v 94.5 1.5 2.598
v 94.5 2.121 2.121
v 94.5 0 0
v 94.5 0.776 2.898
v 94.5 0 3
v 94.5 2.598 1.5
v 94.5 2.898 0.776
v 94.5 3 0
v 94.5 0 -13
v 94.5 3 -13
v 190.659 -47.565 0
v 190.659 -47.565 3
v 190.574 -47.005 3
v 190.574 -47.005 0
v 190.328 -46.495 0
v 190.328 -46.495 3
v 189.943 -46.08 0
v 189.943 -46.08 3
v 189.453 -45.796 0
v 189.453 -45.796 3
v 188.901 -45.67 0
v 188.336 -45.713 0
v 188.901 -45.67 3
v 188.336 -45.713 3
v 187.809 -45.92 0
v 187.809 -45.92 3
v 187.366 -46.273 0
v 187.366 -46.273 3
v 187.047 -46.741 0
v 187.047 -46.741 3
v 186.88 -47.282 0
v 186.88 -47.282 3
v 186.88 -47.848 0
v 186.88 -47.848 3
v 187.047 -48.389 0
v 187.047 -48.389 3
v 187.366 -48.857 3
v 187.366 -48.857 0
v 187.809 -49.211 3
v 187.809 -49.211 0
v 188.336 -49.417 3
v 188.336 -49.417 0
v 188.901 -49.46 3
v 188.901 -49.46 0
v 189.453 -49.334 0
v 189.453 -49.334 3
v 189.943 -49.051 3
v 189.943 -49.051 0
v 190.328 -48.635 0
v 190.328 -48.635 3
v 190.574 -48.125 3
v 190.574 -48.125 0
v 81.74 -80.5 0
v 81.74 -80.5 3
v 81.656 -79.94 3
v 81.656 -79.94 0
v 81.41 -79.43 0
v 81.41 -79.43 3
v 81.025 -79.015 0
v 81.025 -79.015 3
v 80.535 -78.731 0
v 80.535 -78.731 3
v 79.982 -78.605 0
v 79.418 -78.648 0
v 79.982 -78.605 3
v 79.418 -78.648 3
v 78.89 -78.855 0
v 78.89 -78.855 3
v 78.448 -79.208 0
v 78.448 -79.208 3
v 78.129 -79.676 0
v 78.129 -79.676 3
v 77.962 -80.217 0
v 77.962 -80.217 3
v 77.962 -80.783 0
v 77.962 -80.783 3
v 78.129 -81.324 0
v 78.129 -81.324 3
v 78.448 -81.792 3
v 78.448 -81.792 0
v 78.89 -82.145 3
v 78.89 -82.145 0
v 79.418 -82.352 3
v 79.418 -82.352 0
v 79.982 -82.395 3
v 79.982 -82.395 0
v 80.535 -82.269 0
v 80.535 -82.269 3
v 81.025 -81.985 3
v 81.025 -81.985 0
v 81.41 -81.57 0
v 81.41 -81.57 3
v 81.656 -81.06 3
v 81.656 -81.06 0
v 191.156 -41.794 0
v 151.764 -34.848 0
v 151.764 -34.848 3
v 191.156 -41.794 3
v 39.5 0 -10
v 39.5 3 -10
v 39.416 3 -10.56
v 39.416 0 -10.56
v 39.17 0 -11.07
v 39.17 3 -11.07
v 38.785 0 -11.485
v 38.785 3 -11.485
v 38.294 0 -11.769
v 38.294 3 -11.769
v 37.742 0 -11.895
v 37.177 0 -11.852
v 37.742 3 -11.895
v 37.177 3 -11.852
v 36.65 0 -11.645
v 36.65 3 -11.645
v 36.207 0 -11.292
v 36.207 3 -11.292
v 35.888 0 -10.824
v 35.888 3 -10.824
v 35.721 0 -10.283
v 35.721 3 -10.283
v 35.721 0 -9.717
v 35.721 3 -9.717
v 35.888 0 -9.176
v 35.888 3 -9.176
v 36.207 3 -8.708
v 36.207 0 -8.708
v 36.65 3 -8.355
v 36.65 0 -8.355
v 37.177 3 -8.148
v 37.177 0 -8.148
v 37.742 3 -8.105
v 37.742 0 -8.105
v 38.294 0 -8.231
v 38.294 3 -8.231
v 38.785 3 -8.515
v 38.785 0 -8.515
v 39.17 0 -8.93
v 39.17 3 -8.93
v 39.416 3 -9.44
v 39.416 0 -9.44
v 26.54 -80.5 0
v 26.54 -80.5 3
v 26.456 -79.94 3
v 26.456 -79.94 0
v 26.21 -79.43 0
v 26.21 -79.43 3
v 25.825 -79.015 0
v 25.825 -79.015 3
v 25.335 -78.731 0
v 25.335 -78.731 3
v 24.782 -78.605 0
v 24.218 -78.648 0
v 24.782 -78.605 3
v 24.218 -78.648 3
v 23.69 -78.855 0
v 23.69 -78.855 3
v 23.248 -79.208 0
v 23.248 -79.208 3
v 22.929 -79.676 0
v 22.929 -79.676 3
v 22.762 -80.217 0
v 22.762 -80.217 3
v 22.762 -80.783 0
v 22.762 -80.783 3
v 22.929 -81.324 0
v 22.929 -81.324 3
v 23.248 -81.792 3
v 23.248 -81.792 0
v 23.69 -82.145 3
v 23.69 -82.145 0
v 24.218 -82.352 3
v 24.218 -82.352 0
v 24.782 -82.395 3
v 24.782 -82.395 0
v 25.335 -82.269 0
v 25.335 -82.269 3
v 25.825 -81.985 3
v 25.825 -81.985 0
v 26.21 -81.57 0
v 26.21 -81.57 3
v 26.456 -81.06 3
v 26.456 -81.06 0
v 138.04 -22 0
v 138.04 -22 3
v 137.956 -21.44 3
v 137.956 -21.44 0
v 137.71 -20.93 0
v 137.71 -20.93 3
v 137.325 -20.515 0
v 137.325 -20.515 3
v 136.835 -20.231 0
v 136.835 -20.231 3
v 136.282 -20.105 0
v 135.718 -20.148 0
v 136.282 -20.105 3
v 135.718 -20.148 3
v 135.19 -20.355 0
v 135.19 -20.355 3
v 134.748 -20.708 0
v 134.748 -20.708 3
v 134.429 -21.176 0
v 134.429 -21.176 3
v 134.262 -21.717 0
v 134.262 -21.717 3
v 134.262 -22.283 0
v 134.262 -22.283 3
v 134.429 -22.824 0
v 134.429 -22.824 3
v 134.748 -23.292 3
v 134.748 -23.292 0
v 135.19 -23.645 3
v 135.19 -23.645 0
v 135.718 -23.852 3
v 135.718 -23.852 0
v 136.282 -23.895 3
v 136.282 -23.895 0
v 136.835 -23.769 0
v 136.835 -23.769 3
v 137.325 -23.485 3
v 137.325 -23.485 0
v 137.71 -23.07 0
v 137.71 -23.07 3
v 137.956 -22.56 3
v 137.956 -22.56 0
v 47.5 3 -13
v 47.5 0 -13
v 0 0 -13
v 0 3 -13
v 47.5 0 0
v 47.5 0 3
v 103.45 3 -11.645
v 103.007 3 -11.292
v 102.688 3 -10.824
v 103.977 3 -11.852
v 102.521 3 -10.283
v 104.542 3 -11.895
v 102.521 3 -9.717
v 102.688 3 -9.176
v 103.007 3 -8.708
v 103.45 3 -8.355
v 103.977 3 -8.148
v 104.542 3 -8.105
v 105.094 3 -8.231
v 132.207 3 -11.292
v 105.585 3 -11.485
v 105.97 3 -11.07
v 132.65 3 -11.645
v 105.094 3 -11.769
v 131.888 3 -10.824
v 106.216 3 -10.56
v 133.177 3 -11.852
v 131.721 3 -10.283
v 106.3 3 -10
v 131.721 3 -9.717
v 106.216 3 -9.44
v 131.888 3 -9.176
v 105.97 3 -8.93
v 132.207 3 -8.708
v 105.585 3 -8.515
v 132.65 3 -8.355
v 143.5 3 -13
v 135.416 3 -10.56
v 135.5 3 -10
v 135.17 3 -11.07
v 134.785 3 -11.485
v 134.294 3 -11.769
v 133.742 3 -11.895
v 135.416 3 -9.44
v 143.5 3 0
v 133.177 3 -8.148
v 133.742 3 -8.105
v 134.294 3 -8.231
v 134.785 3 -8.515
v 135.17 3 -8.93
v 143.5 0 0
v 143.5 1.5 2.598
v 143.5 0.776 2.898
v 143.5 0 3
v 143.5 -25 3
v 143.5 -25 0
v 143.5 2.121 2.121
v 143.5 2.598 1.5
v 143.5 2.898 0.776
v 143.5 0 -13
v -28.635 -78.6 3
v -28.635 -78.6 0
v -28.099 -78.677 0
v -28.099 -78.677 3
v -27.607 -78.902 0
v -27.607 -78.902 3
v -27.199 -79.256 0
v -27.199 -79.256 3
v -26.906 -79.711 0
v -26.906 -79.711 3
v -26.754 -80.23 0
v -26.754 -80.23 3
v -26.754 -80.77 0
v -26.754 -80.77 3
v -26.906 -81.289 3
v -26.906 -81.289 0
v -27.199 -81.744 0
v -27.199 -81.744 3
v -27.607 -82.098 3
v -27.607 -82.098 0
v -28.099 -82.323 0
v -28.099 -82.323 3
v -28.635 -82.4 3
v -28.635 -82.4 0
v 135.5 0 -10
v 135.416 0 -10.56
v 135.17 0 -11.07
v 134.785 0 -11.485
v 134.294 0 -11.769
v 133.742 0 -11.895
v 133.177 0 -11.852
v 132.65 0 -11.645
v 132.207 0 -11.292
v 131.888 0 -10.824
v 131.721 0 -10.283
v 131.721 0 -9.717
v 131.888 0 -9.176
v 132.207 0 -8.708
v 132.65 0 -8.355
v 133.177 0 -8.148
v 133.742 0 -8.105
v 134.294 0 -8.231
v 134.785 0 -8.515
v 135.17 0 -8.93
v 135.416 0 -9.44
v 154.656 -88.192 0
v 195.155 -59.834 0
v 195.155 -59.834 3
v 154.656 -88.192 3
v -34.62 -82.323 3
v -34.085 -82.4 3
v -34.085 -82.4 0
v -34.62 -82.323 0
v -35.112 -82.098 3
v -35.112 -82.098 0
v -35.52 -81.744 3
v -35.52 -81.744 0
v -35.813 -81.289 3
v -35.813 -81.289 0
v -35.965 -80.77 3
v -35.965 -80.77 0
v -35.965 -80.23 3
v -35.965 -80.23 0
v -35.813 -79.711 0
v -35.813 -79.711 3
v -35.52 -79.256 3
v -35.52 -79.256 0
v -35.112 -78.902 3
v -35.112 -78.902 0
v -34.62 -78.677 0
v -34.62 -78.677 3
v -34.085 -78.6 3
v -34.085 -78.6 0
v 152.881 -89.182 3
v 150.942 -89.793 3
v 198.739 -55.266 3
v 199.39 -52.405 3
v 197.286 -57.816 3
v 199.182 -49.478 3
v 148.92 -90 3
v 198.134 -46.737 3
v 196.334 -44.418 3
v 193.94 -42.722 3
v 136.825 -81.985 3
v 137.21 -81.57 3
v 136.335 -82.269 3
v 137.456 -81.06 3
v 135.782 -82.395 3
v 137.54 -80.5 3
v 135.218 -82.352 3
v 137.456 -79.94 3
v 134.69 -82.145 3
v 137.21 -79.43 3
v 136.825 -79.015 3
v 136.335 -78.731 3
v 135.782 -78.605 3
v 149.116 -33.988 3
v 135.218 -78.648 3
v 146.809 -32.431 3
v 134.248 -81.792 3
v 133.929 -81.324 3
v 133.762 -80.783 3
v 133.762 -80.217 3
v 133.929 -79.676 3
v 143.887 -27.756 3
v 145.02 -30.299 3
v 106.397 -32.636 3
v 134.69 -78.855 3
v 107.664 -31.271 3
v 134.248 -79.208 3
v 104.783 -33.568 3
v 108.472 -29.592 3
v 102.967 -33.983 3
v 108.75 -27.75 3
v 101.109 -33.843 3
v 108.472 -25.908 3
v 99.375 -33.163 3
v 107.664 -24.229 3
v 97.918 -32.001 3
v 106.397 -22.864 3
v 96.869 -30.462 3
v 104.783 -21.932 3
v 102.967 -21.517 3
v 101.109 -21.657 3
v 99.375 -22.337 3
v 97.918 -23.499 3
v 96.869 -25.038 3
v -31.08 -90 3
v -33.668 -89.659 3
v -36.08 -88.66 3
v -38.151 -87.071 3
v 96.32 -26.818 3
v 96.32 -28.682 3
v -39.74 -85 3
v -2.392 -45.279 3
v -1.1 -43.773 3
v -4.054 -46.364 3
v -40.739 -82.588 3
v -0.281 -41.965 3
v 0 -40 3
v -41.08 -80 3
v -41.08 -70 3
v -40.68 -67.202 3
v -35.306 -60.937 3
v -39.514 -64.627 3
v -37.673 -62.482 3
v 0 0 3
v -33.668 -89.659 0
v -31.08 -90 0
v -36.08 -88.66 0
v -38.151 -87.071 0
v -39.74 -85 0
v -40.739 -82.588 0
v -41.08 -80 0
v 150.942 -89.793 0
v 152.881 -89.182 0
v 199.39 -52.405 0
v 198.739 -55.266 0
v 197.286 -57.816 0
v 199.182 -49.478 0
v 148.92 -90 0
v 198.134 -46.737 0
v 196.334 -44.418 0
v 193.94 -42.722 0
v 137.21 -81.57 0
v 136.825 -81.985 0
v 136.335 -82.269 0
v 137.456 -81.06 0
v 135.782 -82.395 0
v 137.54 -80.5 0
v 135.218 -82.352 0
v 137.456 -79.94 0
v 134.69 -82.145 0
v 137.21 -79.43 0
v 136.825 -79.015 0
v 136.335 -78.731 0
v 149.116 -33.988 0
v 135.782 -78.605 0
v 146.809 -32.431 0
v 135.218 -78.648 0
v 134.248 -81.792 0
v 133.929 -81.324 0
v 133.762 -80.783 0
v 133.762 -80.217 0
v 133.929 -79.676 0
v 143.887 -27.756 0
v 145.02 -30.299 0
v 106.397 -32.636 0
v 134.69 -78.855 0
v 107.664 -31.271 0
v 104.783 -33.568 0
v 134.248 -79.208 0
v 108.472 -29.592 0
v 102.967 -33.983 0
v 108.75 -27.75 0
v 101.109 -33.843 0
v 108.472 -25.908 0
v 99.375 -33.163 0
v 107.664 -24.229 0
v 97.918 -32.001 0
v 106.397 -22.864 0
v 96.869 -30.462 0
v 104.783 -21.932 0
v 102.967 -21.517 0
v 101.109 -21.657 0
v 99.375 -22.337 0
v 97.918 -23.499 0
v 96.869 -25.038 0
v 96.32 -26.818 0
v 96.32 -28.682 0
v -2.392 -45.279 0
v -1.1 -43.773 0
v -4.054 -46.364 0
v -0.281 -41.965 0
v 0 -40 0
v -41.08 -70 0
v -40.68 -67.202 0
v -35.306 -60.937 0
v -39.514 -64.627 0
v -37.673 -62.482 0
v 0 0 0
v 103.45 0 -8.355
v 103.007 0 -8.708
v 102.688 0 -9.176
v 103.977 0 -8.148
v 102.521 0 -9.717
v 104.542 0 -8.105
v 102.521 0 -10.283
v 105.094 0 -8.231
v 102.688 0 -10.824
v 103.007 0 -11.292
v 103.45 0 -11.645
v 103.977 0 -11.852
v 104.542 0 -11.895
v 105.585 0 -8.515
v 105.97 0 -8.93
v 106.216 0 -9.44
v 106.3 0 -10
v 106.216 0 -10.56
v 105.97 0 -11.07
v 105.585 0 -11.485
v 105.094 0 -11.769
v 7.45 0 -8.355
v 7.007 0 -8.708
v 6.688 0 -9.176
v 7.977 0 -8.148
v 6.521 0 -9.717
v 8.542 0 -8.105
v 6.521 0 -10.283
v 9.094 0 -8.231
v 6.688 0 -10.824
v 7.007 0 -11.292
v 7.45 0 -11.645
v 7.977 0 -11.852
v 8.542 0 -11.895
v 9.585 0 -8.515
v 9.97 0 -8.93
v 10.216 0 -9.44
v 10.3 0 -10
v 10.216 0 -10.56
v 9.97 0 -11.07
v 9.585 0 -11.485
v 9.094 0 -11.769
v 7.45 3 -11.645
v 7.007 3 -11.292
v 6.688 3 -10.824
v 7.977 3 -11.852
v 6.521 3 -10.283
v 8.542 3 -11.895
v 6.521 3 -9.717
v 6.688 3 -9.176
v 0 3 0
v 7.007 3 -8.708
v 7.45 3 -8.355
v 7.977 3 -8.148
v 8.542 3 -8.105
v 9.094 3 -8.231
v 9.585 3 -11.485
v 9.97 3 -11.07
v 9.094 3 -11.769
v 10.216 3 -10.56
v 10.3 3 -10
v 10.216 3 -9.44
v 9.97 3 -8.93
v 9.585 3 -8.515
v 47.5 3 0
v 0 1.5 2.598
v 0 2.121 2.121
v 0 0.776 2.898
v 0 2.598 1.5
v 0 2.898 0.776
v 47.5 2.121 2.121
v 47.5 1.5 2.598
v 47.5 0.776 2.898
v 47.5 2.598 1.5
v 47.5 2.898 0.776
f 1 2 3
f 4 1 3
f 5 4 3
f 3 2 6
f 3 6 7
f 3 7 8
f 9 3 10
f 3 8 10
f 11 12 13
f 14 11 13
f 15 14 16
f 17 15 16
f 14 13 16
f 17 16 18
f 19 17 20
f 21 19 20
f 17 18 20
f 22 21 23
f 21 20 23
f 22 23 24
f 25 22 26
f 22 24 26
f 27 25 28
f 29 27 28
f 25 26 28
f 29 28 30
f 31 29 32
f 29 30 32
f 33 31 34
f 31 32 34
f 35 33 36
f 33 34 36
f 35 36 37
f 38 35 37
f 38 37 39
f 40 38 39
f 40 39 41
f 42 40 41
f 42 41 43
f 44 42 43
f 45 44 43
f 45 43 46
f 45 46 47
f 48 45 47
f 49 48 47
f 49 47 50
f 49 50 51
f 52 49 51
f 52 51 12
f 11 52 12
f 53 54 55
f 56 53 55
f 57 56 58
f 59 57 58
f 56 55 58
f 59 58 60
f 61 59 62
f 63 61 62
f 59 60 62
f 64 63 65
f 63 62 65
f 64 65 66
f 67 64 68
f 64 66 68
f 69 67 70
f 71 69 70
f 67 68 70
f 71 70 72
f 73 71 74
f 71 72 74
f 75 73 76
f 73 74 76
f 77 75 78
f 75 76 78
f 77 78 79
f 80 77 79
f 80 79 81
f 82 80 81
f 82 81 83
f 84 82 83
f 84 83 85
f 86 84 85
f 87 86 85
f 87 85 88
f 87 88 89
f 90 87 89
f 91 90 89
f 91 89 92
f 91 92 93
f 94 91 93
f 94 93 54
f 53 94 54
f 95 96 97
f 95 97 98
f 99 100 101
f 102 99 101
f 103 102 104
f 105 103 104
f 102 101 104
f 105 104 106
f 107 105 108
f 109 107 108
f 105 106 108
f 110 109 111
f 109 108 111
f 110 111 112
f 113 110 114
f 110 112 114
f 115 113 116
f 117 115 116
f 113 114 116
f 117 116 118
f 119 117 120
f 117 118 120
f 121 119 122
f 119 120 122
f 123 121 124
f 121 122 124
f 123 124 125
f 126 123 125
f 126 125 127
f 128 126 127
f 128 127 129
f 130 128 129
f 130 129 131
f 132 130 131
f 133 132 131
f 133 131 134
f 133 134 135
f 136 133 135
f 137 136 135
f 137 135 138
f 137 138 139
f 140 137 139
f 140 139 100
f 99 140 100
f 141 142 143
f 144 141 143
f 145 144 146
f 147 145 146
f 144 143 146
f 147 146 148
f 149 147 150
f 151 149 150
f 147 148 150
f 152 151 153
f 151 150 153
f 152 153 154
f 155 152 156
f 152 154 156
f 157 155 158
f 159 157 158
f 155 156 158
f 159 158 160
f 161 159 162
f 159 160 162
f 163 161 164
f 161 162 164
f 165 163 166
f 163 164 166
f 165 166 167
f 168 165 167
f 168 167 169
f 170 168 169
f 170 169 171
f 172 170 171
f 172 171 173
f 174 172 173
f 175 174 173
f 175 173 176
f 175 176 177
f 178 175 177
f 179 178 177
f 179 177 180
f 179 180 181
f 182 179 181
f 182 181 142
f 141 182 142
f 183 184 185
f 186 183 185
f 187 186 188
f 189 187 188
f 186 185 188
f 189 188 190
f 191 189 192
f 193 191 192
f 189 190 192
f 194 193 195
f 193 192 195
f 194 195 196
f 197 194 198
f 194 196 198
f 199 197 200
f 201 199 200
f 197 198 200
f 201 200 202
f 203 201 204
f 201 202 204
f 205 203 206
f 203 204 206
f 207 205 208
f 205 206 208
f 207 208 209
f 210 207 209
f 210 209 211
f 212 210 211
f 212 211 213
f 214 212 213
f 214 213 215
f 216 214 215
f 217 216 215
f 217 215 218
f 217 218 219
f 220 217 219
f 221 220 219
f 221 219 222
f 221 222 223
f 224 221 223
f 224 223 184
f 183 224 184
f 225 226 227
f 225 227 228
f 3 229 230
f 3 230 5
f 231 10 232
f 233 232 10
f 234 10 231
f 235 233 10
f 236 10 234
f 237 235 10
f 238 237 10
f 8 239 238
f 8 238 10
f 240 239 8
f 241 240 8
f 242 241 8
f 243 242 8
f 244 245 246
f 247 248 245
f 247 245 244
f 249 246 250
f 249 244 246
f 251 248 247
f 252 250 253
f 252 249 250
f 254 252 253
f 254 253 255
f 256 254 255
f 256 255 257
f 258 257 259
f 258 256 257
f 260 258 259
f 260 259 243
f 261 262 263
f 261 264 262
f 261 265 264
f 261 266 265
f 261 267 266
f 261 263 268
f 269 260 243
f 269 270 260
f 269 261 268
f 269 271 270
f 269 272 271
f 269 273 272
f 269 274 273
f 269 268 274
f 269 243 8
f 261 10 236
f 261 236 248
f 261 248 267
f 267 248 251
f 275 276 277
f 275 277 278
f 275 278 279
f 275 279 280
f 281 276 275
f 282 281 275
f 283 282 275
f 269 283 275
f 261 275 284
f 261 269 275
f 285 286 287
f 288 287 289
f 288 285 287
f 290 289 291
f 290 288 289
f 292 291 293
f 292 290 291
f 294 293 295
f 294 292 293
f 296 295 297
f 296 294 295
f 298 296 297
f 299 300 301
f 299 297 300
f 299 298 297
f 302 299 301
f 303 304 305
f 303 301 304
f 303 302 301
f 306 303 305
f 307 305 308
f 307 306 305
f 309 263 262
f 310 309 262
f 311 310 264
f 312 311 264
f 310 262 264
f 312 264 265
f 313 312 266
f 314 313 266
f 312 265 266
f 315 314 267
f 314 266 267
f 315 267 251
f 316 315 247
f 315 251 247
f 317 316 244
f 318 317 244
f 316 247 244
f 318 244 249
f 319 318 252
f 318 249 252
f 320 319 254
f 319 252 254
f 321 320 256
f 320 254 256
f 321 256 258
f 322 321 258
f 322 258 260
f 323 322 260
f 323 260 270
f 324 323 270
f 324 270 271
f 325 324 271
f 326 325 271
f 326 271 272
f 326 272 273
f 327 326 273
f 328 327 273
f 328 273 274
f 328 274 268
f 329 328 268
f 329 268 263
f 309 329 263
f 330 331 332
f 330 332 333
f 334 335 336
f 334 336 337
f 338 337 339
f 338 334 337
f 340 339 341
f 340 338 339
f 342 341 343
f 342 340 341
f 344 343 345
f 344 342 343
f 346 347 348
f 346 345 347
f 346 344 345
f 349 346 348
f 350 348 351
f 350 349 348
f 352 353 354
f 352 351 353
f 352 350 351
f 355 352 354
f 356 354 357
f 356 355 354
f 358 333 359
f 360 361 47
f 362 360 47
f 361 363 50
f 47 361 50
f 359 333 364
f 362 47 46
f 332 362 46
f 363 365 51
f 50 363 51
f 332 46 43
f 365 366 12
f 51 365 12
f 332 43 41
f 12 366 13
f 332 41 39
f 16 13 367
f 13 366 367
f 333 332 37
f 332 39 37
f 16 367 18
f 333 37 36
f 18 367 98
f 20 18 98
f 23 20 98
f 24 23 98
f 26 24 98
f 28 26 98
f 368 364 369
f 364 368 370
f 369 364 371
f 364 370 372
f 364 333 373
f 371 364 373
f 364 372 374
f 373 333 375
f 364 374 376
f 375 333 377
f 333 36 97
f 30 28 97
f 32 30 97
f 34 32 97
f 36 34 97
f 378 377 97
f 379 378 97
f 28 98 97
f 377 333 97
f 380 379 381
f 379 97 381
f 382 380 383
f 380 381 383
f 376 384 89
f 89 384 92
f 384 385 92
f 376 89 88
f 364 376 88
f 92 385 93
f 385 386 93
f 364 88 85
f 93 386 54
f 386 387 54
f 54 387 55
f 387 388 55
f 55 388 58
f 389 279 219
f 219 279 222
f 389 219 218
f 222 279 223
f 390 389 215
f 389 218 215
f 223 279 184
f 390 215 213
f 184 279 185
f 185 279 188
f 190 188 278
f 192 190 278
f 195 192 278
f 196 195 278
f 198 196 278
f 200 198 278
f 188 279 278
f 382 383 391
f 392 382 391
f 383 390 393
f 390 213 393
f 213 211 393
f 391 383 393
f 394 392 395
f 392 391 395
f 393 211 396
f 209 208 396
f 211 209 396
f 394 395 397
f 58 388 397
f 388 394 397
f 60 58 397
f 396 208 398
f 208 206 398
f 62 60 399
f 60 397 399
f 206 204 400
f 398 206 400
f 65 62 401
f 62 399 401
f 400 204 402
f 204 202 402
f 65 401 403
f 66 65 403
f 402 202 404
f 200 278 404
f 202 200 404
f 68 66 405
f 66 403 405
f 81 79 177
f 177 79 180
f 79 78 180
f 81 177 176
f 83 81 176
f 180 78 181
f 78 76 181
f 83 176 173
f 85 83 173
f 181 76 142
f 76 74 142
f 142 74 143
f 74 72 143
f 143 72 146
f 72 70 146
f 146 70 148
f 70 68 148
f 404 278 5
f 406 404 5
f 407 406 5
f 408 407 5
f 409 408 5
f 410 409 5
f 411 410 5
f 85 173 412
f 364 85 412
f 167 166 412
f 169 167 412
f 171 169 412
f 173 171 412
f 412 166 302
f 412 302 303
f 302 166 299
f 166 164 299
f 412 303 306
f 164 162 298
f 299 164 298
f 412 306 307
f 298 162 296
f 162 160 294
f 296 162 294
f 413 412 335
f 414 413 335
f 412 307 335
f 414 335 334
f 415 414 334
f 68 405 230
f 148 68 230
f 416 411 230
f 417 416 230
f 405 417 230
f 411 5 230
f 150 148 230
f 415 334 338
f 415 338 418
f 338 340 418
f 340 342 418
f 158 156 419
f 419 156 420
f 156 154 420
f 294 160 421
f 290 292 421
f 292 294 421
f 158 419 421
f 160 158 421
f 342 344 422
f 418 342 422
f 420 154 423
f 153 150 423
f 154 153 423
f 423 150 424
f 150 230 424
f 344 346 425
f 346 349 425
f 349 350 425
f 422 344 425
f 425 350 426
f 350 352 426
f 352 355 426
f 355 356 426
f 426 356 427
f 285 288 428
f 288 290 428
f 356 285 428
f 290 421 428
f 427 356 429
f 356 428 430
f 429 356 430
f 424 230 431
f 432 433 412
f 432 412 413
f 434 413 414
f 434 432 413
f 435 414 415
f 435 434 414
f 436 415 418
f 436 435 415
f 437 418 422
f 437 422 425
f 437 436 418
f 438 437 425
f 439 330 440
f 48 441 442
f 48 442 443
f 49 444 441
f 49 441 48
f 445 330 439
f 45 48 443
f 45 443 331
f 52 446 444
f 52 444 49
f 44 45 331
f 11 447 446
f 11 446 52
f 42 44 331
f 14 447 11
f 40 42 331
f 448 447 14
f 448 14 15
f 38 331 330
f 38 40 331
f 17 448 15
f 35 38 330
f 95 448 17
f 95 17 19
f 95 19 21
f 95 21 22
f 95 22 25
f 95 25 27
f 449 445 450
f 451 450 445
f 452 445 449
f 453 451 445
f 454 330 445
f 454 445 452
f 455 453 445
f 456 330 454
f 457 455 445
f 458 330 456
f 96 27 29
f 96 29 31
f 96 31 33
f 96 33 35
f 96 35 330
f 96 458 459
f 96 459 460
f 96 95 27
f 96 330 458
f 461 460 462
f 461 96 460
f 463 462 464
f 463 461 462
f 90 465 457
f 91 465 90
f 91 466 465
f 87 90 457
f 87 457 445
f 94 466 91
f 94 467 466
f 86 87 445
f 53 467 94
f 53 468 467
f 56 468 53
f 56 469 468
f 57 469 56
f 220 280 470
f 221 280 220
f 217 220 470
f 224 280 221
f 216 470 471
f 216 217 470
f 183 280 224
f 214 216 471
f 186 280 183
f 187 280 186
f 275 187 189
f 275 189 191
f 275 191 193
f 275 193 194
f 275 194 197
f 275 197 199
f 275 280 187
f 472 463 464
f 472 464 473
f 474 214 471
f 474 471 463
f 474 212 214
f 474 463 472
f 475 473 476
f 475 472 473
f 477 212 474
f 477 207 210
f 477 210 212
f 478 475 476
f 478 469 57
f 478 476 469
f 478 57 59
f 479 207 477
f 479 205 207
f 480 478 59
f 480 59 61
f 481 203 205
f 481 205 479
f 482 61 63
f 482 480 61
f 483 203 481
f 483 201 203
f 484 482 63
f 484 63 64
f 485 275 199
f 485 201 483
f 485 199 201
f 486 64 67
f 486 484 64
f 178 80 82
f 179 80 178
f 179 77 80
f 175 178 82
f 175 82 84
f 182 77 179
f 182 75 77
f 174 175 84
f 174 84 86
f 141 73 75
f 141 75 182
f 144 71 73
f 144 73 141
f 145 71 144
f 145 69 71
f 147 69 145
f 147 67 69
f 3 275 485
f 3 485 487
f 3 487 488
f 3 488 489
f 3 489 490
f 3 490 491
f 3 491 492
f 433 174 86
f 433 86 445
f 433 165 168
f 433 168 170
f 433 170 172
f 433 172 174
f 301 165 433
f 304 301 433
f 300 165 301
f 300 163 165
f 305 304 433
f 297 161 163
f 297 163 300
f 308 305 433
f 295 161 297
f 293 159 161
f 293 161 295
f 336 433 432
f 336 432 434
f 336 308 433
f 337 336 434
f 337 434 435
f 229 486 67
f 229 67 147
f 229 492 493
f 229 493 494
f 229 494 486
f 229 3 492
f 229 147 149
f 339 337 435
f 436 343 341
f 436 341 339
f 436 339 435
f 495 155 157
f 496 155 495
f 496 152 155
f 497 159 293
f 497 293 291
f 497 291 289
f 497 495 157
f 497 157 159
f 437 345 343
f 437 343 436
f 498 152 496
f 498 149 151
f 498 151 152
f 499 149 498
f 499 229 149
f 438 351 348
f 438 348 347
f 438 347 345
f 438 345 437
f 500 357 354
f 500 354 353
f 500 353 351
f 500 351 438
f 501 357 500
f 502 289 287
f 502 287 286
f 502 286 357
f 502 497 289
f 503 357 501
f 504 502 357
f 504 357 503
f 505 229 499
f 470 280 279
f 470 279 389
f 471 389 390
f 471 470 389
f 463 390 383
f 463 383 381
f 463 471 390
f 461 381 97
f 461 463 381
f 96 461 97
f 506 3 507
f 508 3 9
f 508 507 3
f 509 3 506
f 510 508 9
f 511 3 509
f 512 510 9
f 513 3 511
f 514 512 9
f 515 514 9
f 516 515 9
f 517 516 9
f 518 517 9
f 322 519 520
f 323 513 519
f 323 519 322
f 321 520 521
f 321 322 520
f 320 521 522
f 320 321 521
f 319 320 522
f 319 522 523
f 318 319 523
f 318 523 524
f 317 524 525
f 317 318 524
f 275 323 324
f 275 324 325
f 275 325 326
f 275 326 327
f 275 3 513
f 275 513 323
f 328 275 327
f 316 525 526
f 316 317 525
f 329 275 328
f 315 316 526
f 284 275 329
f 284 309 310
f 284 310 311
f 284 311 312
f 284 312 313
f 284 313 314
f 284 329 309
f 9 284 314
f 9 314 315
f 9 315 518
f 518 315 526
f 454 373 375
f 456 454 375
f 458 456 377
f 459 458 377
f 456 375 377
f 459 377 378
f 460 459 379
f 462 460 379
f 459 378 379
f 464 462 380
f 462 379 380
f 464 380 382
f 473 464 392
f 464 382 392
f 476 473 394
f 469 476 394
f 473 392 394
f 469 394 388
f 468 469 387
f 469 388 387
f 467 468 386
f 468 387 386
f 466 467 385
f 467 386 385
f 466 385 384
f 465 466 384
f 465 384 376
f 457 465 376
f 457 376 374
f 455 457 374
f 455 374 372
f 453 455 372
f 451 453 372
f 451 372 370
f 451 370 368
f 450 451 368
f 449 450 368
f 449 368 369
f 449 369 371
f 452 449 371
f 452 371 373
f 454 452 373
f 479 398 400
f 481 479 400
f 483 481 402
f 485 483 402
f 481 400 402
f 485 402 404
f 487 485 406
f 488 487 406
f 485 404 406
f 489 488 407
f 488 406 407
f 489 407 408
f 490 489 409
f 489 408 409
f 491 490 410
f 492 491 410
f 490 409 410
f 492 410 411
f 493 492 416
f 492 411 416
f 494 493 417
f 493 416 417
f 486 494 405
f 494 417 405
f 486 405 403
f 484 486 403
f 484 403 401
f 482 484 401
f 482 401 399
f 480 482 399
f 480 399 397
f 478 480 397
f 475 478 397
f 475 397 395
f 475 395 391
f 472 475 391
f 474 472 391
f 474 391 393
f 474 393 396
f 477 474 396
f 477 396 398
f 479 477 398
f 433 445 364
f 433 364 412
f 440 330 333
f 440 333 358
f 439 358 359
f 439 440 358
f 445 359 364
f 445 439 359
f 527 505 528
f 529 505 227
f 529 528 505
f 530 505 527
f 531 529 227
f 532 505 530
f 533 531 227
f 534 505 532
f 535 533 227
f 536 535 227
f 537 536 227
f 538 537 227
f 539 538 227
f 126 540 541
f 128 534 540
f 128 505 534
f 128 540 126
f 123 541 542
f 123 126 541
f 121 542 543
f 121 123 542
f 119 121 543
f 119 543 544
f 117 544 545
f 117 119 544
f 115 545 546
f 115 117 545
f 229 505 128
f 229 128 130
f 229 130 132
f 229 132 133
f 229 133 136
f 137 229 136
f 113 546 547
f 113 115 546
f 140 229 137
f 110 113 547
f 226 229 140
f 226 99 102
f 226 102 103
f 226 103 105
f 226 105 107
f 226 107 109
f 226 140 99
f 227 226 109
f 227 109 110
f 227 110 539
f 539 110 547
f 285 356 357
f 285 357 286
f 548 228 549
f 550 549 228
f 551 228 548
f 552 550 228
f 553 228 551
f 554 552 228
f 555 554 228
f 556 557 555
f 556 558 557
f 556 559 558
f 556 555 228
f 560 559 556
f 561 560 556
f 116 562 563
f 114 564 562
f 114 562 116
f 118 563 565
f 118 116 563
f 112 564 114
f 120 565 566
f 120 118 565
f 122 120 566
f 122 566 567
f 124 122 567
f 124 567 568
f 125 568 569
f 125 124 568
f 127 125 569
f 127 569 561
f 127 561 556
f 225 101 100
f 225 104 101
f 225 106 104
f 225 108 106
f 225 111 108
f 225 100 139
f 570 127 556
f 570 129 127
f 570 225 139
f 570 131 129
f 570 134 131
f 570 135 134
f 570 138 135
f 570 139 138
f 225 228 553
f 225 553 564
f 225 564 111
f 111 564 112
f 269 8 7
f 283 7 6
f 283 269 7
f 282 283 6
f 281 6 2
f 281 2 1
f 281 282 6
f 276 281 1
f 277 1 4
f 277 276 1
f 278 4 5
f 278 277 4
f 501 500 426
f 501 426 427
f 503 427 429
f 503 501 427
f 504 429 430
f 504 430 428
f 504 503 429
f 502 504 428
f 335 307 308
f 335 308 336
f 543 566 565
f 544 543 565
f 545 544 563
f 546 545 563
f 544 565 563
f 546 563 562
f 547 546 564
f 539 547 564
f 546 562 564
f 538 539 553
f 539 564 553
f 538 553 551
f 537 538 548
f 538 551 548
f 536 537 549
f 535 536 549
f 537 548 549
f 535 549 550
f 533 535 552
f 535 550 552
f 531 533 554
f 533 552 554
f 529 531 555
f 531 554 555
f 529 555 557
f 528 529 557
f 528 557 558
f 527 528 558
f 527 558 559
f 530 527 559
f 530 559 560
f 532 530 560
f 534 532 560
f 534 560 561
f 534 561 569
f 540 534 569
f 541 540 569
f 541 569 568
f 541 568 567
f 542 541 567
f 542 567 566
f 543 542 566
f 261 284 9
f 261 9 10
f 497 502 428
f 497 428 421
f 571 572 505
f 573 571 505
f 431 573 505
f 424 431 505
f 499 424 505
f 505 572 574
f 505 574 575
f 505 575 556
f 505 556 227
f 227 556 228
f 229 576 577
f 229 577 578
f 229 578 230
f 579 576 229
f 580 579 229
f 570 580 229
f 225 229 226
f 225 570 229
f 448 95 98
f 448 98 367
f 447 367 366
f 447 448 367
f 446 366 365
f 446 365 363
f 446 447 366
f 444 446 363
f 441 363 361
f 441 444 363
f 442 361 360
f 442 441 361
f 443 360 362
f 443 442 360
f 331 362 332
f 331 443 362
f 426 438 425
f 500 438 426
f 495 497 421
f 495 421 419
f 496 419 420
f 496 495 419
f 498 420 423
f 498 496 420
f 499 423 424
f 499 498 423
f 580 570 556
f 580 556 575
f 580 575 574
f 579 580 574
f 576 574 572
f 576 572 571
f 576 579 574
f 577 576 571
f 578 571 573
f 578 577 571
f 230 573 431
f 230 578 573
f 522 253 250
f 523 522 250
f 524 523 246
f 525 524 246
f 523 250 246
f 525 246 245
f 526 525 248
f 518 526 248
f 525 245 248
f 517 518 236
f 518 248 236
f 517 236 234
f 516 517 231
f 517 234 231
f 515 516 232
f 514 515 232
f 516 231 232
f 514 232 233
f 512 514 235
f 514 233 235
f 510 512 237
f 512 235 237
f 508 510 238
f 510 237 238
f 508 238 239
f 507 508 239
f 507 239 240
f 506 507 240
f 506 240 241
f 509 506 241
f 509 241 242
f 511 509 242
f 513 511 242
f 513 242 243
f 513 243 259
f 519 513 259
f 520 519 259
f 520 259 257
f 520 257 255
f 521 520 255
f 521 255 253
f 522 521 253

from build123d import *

# Parameters (mm, degrees)
BOSS_EXTRUDE1_DEPTH = 3
SKETCH2_R           = 1.9
SKETCH2_R_2         = 6.25
CUT_EXTRUDE1_DEPTH  = 4
BOSS_EXTRUDE2_DEPTH = 143.5
SKETCH4_W           = 47
SKETCH4_H           = 16
CUT_EXTRUDE2_DEPTH  = 3
SKETCH5_R           = 1.9
CUT_EXTRUDE3_DEPTH  = 94


with BuildPart() as part:
    # Sketch1 → Boss-Extrude1 (new body)
    with BuildSketch(Plane.XY):
        with BuildLine():
            Line((0, 0), (143.5, 0))
            Line((143.5, 0), (143.5, -25))
            ThreePointArc((143.5, -25), (145.839555569, -31.427876097), (151.763518223, -34.84807753))
            Line((151.763518223, -34.84807753), (191.155828344, -41.794004637))
            ThreePointArc((191.155828344, -41.794004637), (199.182306638, -49.477686028), (195.155110931, -59.83360261))
            Line((195.155110931, -59.83360261), (154.655807102, -88.191520443))
            ThreePointArc((154.655807102, -88.191520443), (151.927100734, -89.537169507), (148.920042738, -90))
            Line((148.920042738, -90), (-31.079957262, -90))
            ThreePointArc((-31.079957262, -90), (-38.151025073, -87.071067812), (-41.079957262, -80))
            Line((-41.079957262, -80), (-41.079957262, -70))
            ThreePointArc((-41.079957262, -70), (-39.51387172, -64.627003917), (-35.306139879, -60.93692213))
            Line((-35.306139879, -60.93692213), (-4.054276098, -46.363938717))
            ThreePointArc((-4.054276098, -46.363938717), (-1.099678559, -43.772826218), (0, -40))
            Line((0, -40), (0, 0))
        make_face()
    extrude(amount=BOSS_EXTRUDE1_DEPTH)

    # Sketch2 → Cut-Extrude1 (cut, through all)
    with BuildSketch(Plane.XY.offset(3)):
        with Locations((188.758637025, -47.565112823)):
            Circle(SKETCH2_R)
        with Locations((135.640436691, -80.5)):
            Circle(SKETCH2_R)
        with Locations((79.840436691, -80.5)):
            Circle(SKETCH2_R)
        with Locations((24.640436691, -80.5)):
            Circle(SKETCH2_R)
        with Locations((102.5, -27.75)):
            Circle(SKETCH2_R_2)
        with Locations((136.140436691, -22)):
            Circle(SKETCH2_R)
        with BuildLine():
            Line((-28.634563309, -82.4), (-34.084563309, -82.4))
            ThreePointArc((-34.084563309, -82.4), (-35.984563309, -80.5), (-34.084563309, -78.6))
            Line((-34.084563309, -78.6), (-28.634563309, -78.6))
            ThreePointArc((-28.634563309, -78.6), (-26.734563309, -80.5), (-28.634563309, -82.4))
        make_face()
    extrude(amount=-CUT_EXTRUDE1_DEPTH, mode=Mode.SUBTRACT)

    # Sketch3 → Boss-Extrude2 (add)
    with BuildSketch(Plane(origin=(143.5, 0, 0), x_dir=(0, 0, -1), z_dir=(1, 0, 0))):
        with BuildLine():
            Line((0, 0), (13, 0))
            Line((13, 0), (13, 3))
            Line((13, 3), (0, 3))
            ThreePointArc((0, 3), (-2.121320344, 2.121320344), (-3, 0))
            Line((-3, 0), (0, 0))
        make_face()
    extrude(amount=-BOSS_EXTRUDE2_DEPTH)

    # Sketch4 → Cut-Extrude2 (cut)
    with BuildSketch(Plane(origin=(0, 3, 0), x_dir=(1, 0, 0), z_dir=(0, 1, 0))):
        with Locations((71, 5)):
            Rectangle(SKETCH4_W, SKETCH4_H)
    extrude(amount=-CUT_EXTRUDE2_DEPTH, mode=Mode.SUBTRACT)

    # Sketch5 → Cut-Extrude3 (cut, through all)
    with BuildSketch(Plane(origin=(0, 3, 0), x_dir=(1, 0, 0), z_dir=(0, 1, 0))):
        with Locations((8.4, 10)):
            Circle(SKETCH5_R)
        with Locations((37.6, 10)):
            Circle(SKETCH5_R)
        with Locations((104.4, 10)):
            Circle(SKETCH5_R)
        with Locations((133.6, 10)):
            Circle(SKETCH5_R)
    extrude(amount=-CUT_EXTRUDE3_DEPTH, mode=Mode.SUBTRACT)


solid = part.part
